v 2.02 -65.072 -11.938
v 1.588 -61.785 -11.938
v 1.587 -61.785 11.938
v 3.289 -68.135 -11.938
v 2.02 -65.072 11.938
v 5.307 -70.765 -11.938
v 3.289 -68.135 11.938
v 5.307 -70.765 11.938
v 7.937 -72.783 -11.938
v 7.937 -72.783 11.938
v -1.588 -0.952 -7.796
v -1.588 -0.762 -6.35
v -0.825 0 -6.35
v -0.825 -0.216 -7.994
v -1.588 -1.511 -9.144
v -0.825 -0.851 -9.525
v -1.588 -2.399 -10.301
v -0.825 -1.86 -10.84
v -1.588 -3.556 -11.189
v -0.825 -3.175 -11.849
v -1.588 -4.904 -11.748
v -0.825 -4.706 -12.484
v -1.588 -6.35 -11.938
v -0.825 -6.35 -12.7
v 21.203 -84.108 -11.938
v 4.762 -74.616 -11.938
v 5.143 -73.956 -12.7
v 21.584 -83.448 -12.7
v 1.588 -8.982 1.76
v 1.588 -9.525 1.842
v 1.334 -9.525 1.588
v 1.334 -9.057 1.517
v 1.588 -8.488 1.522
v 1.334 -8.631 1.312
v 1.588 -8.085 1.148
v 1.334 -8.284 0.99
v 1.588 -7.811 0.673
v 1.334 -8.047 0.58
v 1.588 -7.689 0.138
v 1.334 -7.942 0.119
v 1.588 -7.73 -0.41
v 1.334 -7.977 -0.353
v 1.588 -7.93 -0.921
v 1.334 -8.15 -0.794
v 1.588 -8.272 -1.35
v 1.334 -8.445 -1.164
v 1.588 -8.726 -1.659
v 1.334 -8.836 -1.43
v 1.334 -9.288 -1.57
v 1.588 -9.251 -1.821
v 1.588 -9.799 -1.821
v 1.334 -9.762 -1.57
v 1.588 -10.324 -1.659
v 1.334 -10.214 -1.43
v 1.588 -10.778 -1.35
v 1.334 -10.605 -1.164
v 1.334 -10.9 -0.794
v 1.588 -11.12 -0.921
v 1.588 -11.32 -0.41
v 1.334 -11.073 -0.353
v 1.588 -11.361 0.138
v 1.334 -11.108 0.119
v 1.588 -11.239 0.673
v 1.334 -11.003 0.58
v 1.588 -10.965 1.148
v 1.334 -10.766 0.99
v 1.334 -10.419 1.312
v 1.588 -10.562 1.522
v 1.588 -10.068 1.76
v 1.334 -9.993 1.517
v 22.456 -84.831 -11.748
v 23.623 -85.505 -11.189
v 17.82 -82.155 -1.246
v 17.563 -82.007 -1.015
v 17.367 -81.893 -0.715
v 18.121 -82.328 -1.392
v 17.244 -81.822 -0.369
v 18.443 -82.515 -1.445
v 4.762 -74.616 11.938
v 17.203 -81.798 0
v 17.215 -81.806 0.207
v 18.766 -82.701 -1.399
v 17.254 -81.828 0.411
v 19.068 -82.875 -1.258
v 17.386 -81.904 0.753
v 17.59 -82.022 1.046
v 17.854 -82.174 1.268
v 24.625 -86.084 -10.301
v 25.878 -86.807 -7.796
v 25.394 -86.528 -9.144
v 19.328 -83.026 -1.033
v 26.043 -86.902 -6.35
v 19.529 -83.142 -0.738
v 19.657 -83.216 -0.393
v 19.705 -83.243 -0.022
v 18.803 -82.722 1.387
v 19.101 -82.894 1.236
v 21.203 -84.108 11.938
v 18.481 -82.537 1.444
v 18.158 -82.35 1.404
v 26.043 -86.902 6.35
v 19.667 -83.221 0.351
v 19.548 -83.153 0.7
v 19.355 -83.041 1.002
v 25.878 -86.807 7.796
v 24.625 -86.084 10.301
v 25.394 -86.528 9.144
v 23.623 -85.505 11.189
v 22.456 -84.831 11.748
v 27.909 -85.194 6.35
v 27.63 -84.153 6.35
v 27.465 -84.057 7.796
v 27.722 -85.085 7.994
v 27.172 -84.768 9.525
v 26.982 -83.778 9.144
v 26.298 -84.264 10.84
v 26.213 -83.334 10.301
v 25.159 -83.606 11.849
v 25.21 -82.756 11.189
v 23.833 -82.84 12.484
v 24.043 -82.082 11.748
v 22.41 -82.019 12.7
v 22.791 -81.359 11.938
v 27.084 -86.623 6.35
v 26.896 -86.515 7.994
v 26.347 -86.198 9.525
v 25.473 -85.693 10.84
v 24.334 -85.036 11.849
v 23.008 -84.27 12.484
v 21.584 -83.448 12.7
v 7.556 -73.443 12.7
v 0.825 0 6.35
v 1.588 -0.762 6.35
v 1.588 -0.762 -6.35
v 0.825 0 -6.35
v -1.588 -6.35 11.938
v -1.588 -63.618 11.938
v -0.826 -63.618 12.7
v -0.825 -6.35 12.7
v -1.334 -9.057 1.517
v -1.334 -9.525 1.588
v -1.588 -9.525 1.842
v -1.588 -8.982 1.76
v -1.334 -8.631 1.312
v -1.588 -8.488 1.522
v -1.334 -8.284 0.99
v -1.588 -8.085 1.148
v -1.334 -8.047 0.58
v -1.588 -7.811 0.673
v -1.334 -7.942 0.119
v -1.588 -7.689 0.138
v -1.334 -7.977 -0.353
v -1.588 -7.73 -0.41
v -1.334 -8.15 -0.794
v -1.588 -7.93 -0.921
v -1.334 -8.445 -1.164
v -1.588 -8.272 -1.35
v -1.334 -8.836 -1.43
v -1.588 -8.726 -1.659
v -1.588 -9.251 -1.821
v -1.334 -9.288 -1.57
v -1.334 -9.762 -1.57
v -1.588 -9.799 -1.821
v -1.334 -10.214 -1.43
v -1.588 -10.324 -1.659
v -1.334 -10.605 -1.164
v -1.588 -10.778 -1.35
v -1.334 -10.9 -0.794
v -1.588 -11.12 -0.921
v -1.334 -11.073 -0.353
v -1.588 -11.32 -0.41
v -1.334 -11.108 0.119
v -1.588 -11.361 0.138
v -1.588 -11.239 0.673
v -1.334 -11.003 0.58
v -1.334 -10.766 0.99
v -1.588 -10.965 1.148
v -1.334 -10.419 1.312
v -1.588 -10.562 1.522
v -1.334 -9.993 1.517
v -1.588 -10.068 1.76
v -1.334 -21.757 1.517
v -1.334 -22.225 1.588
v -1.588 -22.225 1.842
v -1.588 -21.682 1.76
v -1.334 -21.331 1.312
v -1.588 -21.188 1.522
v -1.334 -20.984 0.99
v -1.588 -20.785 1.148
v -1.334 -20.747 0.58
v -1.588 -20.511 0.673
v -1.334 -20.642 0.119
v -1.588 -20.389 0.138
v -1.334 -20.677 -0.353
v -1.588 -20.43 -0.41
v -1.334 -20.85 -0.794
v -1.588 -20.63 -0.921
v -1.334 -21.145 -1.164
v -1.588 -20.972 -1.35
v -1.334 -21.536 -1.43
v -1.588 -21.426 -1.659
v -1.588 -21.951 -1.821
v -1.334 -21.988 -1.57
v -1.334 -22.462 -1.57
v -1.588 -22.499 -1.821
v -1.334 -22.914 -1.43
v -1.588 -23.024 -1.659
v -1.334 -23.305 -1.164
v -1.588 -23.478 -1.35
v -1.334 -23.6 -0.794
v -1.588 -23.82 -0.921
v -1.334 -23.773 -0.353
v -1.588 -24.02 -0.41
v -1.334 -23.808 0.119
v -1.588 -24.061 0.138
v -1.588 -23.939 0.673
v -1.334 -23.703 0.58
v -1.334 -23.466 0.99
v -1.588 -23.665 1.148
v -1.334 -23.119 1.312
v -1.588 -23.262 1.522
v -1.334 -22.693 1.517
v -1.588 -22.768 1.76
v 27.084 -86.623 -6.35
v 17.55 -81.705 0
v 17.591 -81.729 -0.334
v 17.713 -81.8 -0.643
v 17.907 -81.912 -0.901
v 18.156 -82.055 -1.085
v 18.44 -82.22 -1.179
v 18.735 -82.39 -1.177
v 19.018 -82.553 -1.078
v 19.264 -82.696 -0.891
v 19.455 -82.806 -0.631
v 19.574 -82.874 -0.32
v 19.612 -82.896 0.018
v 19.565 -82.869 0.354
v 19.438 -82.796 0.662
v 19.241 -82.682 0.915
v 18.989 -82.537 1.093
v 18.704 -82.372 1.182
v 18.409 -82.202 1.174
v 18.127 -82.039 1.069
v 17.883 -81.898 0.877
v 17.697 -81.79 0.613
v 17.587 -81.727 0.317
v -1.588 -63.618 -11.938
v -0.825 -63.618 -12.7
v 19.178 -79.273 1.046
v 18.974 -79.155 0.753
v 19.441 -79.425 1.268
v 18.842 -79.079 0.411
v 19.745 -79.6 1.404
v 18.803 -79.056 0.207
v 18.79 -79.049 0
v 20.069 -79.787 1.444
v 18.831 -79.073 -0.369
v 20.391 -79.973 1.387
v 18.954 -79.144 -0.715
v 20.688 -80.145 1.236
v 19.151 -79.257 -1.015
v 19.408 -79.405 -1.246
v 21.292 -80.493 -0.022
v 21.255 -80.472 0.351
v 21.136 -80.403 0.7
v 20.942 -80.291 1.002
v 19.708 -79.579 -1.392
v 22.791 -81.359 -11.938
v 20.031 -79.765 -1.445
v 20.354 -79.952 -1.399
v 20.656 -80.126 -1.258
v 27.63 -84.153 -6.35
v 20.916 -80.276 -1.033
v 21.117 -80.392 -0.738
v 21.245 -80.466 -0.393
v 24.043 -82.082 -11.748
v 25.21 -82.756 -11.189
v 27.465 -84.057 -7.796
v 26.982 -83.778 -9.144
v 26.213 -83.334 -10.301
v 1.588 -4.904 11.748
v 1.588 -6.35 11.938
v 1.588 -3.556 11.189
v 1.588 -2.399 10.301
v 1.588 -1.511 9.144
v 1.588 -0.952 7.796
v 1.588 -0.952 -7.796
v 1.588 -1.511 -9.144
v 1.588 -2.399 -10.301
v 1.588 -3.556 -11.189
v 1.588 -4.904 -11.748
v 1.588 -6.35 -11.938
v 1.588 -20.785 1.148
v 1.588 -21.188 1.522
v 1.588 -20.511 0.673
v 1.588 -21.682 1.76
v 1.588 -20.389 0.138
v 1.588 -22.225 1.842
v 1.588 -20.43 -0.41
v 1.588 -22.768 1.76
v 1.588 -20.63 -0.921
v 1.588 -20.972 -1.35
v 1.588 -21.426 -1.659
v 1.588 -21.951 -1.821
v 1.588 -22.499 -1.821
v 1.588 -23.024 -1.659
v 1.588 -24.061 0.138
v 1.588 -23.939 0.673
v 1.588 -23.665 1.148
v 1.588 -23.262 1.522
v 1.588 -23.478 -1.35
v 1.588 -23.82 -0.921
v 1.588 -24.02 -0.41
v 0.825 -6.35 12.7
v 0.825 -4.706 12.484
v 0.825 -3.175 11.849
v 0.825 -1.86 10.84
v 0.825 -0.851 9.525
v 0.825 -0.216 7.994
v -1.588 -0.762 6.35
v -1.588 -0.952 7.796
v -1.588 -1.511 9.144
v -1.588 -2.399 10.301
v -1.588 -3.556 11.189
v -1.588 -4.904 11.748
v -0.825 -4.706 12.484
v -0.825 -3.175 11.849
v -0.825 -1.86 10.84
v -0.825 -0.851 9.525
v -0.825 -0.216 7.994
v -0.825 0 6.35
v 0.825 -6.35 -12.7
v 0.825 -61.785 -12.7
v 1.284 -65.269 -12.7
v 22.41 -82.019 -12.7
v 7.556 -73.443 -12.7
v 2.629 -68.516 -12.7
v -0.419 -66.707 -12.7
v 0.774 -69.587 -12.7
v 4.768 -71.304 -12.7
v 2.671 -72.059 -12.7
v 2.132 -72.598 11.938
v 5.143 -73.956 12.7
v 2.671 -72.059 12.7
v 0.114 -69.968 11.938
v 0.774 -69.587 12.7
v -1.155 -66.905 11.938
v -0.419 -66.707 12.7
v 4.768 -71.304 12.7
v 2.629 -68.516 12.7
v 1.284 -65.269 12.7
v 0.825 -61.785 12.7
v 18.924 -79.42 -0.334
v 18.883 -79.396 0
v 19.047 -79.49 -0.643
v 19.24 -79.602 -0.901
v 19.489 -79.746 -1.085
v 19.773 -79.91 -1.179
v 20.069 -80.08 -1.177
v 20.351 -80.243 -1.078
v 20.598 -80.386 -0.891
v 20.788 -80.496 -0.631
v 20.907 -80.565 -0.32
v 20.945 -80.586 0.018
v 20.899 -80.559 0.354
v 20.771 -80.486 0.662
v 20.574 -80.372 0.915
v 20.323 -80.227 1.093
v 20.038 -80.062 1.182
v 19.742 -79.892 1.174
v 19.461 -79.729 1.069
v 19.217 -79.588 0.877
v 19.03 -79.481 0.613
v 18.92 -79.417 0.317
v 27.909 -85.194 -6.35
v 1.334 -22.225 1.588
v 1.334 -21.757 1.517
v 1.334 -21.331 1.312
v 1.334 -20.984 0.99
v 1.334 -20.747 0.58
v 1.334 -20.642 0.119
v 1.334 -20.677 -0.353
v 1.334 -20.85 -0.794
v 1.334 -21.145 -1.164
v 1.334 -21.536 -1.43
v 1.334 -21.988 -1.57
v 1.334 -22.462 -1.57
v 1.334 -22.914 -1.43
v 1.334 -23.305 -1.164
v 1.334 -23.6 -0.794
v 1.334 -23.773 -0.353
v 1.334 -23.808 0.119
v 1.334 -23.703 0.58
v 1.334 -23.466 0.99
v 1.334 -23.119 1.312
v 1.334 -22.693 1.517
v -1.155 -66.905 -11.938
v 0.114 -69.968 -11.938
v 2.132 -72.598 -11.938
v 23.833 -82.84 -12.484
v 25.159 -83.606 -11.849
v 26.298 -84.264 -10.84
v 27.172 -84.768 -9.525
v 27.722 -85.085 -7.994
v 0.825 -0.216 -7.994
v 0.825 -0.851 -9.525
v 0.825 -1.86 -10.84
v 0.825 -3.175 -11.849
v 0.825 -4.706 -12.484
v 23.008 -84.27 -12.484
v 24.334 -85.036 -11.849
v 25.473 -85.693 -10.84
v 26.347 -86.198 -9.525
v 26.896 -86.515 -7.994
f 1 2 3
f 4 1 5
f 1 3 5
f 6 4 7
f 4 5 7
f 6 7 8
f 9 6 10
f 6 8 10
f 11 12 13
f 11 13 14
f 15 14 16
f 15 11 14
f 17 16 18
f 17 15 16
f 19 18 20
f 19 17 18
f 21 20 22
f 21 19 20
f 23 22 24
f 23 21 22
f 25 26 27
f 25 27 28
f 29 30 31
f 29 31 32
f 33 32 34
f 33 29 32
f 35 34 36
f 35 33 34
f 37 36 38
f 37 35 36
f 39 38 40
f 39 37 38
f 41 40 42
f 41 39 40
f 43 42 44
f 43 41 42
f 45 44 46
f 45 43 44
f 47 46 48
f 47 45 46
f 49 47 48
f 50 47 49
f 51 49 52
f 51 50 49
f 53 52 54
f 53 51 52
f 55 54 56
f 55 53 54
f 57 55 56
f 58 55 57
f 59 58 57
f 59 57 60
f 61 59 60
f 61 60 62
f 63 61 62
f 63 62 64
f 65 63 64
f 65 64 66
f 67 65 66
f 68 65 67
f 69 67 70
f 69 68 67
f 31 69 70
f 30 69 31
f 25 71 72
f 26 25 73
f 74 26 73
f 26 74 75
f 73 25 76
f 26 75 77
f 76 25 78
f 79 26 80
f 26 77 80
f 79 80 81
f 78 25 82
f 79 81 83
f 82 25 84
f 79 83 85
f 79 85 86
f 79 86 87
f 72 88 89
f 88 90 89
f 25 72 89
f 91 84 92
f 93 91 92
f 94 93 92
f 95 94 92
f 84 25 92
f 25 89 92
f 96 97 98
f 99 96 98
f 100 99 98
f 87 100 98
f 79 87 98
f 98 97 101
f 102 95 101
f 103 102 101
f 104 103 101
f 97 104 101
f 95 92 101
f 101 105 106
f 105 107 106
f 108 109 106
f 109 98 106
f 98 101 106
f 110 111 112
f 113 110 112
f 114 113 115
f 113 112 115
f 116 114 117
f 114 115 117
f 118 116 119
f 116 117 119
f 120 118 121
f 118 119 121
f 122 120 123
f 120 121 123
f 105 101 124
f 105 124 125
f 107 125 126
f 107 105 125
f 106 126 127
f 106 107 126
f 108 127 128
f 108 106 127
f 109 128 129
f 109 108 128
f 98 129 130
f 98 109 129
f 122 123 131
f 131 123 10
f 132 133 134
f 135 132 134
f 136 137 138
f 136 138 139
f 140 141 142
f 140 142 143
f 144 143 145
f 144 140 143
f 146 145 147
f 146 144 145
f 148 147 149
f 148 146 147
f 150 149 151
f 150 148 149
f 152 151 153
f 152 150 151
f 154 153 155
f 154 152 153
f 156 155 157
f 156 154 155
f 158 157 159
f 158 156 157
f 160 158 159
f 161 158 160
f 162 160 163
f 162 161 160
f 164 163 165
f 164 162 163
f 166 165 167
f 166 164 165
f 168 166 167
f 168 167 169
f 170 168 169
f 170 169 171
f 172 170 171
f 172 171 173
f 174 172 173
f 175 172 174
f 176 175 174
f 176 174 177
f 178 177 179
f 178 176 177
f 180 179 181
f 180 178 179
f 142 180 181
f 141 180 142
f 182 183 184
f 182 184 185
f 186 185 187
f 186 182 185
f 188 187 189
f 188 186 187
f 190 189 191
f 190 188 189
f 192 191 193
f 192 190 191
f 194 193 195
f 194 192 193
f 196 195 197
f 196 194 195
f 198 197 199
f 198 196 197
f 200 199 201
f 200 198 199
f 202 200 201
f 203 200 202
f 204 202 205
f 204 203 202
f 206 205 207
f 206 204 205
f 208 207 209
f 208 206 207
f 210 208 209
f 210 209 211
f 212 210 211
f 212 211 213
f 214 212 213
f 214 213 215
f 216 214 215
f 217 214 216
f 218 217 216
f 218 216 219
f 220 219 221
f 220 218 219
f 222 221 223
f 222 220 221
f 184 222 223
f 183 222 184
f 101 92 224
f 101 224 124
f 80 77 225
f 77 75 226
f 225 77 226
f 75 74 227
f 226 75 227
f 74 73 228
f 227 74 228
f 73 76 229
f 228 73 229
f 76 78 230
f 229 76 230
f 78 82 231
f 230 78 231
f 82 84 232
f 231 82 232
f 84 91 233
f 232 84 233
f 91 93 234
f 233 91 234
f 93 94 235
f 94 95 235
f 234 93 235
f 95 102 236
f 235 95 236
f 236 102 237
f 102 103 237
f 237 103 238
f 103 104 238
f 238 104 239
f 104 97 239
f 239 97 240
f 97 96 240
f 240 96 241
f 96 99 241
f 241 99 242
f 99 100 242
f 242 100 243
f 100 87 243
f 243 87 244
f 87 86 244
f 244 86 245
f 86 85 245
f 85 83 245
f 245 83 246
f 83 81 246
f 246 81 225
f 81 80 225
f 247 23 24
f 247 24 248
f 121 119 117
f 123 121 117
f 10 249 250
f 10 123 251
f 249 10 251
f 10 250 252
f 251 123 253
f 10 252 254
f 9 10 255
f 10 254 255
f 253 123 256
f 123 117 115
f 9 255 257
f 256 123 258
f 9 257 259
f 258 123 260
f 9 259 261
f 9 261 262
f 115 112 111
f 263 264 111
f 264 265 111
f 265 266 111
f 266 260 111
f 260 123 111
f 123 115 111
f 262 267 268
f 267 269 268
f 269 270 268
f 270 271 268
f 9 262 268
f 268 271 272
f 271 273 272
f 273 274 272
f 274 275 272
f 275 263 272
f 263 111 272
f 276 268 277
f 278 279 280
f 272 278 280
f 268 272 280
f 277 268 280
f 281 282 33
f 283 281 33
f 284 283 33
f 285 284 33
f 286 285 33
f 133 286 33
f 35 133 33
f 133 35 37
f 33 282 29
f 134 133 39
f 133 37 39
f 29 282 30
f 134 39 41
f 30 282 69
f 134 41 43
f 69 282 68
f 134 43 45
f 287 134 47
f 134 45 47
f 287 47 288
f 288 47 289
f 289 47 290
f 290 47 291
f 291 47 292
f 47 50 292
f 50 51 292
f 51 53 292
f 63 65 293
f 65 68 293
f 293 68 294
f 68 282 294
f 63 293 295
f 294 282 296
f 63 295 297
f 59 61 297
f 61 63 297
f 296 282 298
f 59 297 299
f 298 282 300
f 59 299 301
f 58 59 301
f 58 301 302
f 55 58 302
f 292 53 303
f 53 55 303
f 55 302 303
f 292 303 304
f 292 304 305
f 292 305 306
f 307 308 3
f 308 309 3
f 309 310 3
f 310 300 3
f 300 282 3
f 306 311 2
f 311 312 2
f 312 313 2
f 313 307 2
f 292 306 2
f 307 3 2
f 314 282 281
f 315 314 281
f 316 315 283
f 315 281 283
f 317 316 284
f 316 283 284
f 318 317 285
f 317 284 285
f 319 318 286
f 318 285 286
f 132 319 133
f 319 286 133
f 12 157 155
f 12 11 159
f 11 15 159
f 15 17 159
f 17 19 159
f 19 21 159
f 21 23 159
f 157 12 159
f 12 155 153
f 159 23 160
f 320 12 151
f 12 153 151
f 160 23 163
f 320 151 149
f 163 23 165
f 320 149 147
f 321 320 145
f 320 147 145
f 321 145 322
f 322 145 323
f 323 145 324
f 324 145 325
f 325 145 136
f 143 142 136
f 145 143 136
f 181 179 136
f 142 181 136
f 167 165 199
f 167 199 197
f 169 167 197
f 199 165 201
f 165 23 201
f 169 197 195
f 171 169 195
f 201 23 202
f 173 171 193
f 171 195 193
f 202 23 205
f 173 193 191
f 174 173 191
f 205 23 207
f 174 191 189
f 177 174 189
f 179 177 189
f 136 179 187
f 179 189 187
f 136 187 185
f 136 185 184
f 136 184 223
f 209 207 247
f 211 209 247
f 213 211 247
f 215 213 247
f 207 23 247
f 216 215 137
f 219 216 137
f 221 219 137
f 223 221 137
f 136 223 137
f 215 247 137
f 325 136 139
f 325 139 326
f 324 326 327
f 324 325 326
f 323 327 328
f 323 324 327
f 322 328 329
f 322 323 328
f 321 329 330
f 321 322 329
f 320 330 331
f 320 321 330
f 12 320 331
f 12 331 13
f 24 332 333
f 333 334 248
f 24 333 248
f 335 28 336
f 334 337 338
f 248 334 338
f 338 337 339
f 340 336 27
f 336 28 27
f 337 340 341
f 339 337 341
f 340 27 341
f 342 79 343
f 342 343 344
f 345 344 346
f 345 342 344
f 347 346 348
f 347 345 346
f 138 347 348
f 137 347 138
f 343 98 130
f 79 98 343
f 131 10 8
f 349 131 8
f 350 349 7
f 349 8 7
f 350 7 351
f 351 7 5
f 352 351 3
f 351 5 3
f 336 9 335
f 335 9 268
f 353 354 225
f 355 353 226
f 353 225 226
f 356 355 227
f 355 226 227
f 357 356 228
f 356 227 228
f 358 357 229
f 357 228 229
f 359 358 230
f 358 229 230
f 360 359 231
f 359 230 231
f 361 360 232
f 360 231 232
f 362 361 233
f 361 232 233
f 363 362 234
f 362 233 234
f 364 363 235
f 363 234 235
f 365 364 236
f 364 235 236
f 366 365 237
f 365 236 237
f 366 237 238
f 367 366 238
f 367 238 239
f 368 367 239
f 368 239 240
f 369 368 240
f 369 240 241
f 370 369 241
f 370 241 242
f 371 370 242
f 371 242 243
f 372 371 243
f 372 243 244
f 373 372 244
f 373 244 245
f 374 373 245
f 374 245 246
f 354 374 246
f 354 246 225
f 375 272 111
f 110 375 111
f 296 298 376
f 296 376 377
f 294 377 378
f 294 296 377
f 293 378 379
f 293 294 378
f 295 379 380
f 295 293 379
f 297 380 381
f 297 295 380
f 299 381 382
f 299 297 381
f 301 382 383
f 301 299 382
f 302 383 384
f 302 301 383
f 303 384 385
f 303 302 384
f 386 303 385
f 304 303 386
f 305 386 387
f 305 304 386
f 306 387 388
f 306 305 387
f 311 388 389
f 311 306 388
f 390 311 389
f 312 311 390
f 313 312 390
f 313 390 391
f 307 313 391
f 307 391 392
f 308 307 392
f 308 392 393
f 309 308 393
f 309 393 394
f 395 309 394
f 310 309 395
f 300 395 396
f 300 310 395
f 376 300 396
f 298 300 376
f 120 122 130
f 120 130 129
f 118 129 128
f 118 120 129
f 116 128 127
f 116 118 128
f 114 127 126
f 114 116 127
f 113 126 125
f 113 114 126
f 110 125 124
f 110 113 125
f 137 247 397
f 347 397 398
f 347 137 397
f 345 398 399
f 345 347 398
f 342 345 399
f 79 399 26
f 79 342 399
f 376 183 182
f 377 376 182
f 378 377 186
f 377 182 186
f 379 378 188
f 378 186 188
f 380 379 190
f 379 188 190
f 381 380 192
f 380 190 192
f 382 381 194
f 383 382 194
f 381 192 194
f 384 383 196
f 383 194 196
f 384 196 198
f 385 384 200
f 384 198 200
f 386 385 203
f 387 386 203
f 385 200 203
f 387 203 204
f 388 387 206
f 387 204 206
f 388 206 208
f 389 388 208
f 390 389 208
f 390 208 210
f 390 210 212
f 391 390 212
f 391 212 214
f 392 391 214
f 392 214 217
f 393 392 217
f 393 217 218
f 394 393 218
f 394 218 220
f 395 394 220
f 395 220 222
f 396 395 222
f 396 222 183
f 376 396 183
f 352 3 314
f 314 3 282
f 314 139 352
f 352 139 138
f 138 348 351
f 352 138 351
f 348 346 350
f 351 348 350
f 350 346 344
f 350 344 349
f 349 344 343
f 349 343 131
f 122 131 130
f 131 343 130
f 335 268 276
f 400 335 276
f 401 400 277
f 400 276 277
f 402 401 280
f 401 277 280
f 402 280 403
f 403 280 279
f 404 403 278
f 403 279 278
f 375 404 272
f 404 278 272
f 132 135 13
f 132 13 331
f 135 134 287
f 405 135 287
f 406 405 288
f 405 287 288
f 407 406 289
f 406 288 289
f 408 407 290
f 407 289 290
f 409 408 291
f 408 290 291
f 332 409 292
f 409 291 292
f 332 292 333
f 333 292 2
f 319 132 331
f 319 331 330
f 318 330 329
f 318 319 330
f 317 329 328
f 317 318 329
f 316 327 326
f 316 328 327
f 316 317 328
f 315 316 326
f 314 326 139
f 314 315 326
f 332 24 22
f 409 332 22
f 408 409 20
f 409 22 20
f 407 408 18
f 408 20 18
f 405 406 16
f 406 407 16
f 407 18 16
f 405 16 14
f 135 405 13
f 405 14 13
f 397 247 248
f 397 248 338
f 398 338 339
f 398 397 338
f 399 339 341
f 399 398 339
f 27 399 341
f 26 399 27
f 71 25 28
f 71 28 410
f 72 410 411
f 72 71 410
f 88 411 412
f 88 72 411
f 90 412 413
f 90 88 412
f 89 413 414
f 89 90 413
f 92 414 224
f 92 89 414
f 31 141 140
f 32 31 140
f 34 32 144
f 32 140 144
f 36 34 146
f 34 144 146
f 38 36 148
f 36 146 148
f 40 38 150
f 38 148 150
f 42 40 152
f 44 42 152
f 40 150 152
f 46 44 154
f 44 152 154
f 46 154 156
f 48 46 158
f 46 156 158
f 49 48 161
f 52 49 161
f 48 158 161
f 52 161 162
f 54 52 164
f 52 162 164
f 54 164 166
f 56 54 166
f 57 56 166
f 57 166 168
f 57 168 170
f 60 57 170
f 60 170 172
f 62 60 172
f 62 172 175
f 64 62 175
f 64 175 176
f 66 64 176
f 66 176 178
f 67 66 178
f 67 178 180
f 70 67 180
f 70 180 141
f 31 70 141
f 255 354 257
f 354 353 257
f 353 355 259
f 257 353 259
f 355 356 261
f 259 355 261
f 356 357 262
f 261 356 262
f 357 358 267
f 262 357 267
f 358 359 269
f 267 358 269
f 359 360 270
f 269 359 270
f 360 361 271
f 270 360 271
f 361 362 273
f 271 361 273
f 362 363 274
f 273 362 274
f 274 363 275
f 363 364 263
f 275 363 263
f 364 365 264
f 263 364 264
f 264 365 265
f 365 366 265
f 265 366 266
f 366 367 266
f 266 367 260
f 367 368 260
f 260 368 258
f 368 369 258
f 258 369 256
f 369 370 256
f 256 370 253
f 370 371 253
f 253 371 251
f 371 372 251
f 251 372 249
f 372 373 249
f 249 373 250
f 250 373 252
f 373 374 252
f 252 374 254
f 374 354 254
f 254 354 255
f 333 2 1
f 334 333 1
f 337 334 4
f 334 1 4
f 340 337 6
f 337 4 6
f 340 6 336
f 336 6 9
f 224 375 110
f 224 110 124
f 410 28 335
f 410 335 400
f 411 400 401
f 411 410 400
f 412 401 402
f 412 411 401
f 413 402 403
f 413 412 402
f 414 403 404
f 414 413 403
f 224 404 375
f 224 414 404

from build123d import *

# Parameters (mm, degrees)
SKETCH2_W                       = 3.175
SKETCH2_H                       = 25.4
F_1_8_0_125_DIAMETER_HOLE1_D    = 3.175
F_3_32_0_09375_DIAMETER_HOLE2_D = 2.38125
FILLET1_R                       = 12.7
FILLET2_R                       = 6.35
CHAMFER3_SIZE                   = 0.762
CHAMFER2_SIZE                   = 0.254


with BuildPart() as part:
    # Sweep1: sweep along a path in Sketch1
    with BuildLine(Plane.XY) as sweep1_path:
        Line((0, 0), (0, -31.75))
        Line((0, -31.75), (0, -70.0334134))
        Line((0, -70.0334134), (27.49630657, -85.9084134))
    # Sketch2 → Sweep1 (sweep)
    with BuildSketch(Plane(origin=(0, 0, 0), x_dir=(1, 0, 0), z_dir=(0, 1, 0))):
        Rectangle(SKETCH2_W, SKETCH2_H)
    sweep(path=sweep1_path.line, transition=Transition.RIGHT)

    # 1/8 (0.125) Diameter Hole1 (through all)
    with Locations(Plane(origin=(1.5875, 0, 0), x_dir=(0, 0, -1), z_dir=(1, 0, 0))):
        with Locations((0, -9.525), (0, -22.225)):
            Hole(F_1_8_0_125_DIAMETER_HOLE1_D / 2)

    # 3/32 (0.09375) Diameter Hole2 (through all)
    with Locations(Plane(origin=(-29.531607559, -51.150244721, 0), x_dir=(0.866025404, -0.5, 0), z_dir=(0.5, 0.866025404, 0))):
        with Locations((57.2417067, 0)):
            Hole(F_3_32_0_09375_DIAMETER_HOLE2_D / 2)

    # Fillet1
    fillet1_edges = [part.edges().sort_by_distance(p)[0] for p in [
        (1.5875, -69.116869848, 0),
        (-1.5875, -70.949956952, 0),
    ]]
    fillet(fillet1_edges, radius=FILLET1_R)

    # Fillet2
    fillet2_edges = [part.edges().sort_by_distance(p)[0] for p in [
        (27.49630657, -85.9084134, -12.7),
        (27.49630657, -85.9084134, 12.7),
        (0, 0, -12.7),
        (0, 0, 12.7),
    ]]
    fillet(fillet2_edges, radius=FILLET2_R)

    # Chamfer3
    chamfer3_edges = [part.edges().sort_by_distance(p)[0] for p in [
        (12.982897628, -79.362179945, -12.7),
        (12.982897628, -79.362179945, 12.7),
        (15.364147628, -77.070821064, -12.7),
        (0.113977372, -69.967608534, -12.7),
        (0.113977372, -69.967608534, -12.7),
        (0.113977372, -69.967608534, 12.7),
        (15.364147628, -77.070821064, 12.7),
        (0.113977372, -69.967608534, 12.7),
        (3.288977372, -68.134521429, 12.7),
        (3.288977372, -68.134521429, 12.7),
        (3.288977372, -68.134521429, -12.7),
        (3.288977372, -68.134521429, -12.7),
        (1.5875, -34.067260714, 12.7),
        (1.5875, -34.067260714, -12.7),
        (-1.5875, -34.983804267, -12.7),
        (-1.5875, -34.983804267, 12.7),
        (26.70255657, -87.283228729, 0),
        (25.091860223, -86.353292759, 10.840128061),
        (25.091860223, -86.353292759, -10.840128061),
        (28.29005657, -84.533598071, 0),
        (26.679360223, -83.603662102, 10.840128061),
        (26.679360223, -83.603662102, -10.840128061),
        (1.5875, 0, 0),
        (-1.5875, 0, 0),
        (-1.5875, -34.983804267, 12.7),
        (-1.5875, -34.983804267, -12.7),
        (-1.5875, -1.859871939, 10.840128061),
        (-1.5875, -1.859871939, -10.840128061),
        (1.5875, -34.067260714, -12.7),
        (1.5875, -34.067260714, 12.7),
        (1.5875, -1.859871939, 10.840128061),
        (1.5875, -1.859871939, -10.840128061),
    ]]
    chamfer(chamfer3_edges, length=CHAMFER3_SIZE)

    # Chamfer2
    chamfer2_edges = [part.edges().sort_by_distance(p)[0] for p in [
        (1.5875, -22.225, -1.5875),
        (-1.5875, -22.225, -1.5875),
        (1.5875, -9.525, -1.5875),
        (-1.5875, -9.525, -1.5875),
        (19.484776095, -83.116041229, 0),
        (21.072276095, -80.366410571, 0),
    ]]
    chamfer(chamfer2_edges, length=CHAMFER2_SIZE)


solid = part.part
